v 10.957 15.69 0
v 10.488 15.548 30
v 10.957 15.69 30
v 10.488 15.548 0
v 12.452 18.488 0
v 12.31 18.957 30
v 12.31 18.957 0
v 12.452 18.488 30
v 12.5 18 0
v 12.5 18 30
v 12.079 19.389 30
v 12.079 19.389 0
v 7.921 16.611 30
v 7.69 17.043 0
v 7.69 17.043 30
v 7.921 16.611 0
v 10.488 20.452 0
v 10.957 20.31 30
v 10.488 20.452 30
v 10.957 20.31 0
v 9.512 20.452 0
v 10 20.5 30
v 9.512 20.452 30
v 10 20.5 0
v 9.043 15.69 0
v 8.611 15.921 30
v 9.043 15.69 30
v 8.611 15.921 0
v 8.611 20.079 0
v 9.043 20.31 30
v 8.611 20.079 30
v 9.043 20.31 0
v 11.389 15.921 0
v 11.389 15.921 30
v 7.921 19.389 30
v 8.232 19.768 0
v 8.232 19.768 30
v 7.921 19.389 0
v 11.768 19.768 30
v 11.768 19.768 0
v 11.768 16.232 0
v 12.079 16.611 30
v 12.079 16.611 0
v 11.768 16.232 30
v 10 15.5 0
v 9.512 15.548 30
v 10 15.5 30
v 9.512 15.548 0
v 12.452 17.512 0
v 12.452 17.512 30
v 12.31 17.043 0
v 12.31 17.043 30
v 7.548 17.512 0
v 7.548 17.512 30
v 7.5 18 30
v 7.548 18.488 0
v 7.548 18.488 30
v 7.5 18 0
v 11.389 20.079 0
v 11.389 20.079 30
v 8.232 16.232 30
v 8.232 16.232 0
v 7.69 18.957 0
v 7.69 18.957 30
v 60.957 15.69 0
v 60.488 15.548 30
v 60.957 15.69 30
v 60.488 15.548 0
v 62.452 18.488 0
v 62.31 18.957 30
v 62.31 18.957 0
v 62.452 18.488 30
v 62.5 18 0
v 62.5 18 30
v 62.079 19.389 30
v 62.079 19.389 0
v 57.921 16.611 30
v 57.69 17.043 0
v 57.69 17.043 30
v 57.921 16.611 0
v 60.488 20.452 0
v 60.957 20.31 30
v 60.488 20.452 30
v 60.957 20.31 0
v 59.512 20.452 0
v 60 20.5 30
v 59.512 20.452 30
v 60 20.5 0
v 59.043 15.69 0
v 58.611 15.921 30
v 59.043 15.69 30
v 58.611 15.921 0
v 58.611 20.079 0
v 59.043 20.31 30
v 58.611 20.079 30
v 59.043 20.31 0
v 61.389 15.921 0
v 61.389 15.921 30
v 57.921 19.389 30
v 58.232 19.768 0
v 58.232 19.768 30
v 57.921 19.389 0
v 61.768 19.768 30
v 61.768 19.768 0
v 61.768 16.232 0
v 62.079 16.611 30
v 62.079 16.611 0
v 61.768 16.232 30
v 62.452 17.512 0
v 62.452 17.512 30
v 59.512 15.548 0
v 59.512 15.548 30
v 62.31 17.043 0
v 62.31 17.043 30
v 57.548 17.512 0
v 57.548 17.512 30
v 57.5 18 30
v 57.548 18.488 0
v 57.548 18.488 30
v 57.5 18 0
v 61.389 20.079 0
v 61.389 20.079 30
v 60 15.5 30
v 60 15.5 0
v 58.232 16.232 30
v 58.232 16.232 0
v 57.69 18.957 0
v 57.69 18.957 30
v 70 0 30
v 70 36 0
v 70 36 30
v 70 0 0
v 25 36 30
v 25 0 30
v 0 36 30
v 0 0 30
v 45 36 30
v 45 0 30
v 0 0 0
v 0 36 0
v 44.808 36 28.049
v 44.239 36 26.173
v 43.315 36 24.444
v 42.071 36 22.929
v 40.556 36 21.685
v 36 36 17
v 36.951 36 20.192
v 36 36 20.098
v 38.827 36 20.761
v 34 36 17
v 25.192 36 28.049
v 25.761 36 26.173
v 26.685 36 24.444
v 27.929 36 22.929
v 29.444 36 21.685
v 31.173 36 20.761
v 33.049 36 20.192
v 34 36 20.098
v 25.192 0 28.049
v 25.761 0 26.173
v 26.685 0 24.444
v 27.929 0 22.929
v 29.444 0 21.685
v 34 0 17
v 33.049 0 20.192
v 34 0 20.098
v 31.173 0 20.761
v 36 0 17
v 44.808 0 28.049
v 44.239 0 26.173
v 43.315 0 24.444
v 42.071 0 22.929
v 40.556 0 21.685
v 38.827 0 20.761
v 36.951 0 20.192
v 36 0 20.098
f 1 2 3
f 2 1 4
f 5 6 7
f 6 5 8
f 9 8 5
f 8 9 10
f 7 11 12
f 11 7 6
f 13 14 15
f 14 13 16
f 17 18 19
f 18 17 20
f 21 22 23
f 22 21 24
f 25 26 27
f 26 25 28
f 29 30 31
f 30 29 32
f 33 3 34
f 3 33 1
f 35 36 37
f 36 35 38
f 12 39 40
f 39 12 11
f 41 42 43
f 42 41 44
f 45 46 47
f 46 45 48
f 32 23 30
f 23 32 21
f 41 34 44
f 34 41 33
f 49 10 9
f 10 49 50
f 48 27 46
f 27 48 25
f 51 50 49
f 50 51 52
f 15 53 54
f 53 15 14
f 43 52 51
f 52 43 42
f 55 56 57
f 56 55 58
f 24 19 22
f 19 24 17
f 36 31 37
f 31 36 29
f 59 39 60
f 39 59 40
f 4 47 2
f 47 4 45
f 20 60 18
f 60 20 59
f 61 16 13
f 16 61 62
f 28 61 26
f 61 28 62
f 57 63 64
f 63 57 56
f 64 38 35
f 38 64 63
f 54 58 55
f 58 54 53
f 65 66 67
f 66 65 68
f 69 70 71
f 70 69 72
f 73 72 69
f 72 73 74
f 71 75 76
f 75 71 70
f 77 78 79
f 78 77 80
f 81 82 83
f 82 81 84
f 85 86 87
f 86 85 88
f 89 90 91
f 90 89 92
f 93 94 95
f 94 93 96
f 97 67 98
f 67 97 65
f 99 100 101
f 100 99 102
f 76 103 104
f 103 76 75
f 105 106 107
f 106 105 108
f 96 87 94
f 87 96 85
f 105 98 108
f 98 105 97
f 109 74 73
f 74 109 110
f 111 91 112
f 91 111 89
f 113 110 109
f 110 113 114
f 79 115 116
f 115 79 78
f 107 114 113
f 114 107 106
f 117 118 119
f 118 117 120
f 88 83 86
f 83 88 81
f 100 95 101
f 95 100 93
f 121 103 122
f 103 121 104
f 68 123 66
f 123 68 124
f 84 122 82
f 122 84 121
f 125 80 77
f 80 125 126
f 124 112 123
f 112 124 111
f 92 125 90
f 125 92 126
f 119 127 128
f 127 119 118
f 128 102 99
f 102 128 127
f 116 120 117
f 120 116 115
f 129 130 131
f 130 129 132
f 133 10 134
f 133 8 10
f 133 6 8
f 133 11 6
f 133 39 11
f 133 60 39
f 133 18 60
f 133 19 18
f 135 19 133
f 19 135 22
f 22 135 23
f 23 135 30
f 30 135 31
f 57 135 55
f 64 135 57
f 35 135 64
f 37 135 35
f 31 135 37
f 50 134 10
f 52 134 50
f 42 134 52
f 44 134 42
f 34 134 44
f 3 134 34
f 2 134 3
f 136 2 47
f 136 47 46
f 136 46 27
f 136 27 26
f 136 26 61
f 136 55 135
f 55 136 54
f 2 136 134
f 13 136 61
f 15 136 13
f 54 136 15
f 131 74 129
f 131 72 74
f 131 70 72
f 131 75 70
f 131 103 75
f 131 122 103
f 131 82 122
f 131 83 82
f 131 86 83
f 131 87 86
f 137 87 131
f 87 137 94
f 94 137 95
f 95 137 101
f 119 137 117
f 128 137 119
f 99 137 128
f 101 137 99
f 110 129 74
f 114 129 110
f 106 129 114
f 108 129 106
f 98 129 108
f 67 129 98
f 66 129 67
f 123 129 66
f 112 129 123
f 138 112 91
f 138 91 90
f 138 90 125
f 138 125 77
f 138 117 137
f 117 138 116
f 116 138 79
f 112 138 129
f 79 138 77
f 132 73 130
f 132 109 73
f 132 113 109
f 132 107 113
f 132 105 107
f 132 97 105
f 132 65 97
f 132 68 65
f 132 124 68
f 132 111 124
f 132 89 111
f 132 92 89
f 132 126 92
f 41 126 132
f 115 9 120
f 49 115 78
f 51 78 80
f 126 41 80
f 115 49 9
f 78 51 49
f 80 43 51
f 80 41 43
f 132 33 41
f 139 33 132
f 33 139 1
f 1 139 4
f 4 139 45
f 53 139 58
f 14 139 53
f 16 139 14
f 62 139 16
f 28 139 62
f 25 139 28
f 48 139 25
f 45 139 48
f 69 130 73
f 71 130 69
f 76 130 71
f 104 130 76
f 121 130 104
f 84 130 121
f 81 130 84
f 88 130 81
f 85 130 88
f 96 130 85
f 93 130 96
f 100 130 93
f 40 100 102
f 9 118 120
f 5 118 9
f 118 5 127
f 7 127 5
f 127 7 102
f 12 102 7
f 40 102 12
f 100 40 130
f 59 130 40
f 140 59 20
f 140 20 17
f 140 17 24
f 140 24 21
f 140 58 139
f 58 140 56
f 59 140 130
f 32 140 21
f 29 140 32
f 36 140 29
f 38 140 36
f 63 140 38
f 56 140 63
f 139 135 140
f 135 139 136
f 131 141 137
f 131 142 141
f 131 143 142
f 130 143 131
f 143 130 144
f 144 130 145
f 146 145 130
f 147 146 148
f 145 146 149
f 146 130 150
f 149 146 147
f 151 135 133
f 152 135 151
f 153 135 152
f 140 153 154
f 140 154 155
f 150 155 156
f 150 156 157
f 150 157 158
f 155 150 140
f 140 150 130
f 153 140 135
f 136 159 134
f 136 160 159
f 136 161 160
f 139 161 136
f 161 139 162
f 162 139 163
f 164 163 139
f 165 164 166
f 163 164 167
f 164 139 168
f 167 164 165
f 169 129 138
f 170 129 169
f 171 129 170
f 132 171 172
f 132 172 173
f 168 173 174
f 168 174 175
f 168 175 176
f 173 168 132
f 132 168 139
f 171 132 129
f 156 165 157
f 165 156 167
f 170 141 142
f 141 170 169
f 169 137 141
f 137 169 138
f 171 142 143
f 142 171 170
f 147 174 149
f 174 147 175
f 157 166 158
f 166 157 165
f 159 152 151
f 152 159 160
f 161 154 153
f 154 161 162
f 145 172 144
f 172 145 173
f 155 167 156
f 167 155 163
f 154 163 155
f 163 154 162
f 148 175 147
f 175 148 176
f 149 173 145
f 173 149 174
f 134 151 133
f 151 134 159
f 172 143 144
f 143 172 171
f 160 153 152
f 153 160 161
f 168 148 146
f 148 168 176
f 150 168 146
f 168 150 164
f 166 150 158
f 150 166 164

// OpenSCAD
$fn = 32;

// ----------------------------------------------------------------------
// Saddle clamp: split shaft clamp
// ----------------------------------------------------------------------

// --- parameters (mm) ---
blk_l = 70;               // block length, X
blk_w = 36;               // block width, Y
blk_h = 30;               // block height
clamp_r = 10;             // shaft groove radius
hole_r = 2.5;             // bolt hole radius
hole_m = 10;              // bolt hole margin from the ends
saw_w = 2;                // saw kerf width

saw_depth = clamp_r + 3;  // saw kerf depth

difference() {
  cube([blk_l, blk_w, blk_h]);
  translate([blk_l / 2, -1, blk_h])
    rotate([-90, 0, 0])
      cylinder(h = blk_w + 2, r = clamp_r);
  for (sx = [0, 1])
    translate([sx ? blk_l - hole_m : hole_m, blk_w / 2, -1])
      cylinder(r = hole_r, h = blk_h + 2);
  translate([blk_l / 2 - saw_w / 2, -1, blk_h - saw_depth])
    cube([saw_w, blk_w + 2, saw_depth + 1]);
}
